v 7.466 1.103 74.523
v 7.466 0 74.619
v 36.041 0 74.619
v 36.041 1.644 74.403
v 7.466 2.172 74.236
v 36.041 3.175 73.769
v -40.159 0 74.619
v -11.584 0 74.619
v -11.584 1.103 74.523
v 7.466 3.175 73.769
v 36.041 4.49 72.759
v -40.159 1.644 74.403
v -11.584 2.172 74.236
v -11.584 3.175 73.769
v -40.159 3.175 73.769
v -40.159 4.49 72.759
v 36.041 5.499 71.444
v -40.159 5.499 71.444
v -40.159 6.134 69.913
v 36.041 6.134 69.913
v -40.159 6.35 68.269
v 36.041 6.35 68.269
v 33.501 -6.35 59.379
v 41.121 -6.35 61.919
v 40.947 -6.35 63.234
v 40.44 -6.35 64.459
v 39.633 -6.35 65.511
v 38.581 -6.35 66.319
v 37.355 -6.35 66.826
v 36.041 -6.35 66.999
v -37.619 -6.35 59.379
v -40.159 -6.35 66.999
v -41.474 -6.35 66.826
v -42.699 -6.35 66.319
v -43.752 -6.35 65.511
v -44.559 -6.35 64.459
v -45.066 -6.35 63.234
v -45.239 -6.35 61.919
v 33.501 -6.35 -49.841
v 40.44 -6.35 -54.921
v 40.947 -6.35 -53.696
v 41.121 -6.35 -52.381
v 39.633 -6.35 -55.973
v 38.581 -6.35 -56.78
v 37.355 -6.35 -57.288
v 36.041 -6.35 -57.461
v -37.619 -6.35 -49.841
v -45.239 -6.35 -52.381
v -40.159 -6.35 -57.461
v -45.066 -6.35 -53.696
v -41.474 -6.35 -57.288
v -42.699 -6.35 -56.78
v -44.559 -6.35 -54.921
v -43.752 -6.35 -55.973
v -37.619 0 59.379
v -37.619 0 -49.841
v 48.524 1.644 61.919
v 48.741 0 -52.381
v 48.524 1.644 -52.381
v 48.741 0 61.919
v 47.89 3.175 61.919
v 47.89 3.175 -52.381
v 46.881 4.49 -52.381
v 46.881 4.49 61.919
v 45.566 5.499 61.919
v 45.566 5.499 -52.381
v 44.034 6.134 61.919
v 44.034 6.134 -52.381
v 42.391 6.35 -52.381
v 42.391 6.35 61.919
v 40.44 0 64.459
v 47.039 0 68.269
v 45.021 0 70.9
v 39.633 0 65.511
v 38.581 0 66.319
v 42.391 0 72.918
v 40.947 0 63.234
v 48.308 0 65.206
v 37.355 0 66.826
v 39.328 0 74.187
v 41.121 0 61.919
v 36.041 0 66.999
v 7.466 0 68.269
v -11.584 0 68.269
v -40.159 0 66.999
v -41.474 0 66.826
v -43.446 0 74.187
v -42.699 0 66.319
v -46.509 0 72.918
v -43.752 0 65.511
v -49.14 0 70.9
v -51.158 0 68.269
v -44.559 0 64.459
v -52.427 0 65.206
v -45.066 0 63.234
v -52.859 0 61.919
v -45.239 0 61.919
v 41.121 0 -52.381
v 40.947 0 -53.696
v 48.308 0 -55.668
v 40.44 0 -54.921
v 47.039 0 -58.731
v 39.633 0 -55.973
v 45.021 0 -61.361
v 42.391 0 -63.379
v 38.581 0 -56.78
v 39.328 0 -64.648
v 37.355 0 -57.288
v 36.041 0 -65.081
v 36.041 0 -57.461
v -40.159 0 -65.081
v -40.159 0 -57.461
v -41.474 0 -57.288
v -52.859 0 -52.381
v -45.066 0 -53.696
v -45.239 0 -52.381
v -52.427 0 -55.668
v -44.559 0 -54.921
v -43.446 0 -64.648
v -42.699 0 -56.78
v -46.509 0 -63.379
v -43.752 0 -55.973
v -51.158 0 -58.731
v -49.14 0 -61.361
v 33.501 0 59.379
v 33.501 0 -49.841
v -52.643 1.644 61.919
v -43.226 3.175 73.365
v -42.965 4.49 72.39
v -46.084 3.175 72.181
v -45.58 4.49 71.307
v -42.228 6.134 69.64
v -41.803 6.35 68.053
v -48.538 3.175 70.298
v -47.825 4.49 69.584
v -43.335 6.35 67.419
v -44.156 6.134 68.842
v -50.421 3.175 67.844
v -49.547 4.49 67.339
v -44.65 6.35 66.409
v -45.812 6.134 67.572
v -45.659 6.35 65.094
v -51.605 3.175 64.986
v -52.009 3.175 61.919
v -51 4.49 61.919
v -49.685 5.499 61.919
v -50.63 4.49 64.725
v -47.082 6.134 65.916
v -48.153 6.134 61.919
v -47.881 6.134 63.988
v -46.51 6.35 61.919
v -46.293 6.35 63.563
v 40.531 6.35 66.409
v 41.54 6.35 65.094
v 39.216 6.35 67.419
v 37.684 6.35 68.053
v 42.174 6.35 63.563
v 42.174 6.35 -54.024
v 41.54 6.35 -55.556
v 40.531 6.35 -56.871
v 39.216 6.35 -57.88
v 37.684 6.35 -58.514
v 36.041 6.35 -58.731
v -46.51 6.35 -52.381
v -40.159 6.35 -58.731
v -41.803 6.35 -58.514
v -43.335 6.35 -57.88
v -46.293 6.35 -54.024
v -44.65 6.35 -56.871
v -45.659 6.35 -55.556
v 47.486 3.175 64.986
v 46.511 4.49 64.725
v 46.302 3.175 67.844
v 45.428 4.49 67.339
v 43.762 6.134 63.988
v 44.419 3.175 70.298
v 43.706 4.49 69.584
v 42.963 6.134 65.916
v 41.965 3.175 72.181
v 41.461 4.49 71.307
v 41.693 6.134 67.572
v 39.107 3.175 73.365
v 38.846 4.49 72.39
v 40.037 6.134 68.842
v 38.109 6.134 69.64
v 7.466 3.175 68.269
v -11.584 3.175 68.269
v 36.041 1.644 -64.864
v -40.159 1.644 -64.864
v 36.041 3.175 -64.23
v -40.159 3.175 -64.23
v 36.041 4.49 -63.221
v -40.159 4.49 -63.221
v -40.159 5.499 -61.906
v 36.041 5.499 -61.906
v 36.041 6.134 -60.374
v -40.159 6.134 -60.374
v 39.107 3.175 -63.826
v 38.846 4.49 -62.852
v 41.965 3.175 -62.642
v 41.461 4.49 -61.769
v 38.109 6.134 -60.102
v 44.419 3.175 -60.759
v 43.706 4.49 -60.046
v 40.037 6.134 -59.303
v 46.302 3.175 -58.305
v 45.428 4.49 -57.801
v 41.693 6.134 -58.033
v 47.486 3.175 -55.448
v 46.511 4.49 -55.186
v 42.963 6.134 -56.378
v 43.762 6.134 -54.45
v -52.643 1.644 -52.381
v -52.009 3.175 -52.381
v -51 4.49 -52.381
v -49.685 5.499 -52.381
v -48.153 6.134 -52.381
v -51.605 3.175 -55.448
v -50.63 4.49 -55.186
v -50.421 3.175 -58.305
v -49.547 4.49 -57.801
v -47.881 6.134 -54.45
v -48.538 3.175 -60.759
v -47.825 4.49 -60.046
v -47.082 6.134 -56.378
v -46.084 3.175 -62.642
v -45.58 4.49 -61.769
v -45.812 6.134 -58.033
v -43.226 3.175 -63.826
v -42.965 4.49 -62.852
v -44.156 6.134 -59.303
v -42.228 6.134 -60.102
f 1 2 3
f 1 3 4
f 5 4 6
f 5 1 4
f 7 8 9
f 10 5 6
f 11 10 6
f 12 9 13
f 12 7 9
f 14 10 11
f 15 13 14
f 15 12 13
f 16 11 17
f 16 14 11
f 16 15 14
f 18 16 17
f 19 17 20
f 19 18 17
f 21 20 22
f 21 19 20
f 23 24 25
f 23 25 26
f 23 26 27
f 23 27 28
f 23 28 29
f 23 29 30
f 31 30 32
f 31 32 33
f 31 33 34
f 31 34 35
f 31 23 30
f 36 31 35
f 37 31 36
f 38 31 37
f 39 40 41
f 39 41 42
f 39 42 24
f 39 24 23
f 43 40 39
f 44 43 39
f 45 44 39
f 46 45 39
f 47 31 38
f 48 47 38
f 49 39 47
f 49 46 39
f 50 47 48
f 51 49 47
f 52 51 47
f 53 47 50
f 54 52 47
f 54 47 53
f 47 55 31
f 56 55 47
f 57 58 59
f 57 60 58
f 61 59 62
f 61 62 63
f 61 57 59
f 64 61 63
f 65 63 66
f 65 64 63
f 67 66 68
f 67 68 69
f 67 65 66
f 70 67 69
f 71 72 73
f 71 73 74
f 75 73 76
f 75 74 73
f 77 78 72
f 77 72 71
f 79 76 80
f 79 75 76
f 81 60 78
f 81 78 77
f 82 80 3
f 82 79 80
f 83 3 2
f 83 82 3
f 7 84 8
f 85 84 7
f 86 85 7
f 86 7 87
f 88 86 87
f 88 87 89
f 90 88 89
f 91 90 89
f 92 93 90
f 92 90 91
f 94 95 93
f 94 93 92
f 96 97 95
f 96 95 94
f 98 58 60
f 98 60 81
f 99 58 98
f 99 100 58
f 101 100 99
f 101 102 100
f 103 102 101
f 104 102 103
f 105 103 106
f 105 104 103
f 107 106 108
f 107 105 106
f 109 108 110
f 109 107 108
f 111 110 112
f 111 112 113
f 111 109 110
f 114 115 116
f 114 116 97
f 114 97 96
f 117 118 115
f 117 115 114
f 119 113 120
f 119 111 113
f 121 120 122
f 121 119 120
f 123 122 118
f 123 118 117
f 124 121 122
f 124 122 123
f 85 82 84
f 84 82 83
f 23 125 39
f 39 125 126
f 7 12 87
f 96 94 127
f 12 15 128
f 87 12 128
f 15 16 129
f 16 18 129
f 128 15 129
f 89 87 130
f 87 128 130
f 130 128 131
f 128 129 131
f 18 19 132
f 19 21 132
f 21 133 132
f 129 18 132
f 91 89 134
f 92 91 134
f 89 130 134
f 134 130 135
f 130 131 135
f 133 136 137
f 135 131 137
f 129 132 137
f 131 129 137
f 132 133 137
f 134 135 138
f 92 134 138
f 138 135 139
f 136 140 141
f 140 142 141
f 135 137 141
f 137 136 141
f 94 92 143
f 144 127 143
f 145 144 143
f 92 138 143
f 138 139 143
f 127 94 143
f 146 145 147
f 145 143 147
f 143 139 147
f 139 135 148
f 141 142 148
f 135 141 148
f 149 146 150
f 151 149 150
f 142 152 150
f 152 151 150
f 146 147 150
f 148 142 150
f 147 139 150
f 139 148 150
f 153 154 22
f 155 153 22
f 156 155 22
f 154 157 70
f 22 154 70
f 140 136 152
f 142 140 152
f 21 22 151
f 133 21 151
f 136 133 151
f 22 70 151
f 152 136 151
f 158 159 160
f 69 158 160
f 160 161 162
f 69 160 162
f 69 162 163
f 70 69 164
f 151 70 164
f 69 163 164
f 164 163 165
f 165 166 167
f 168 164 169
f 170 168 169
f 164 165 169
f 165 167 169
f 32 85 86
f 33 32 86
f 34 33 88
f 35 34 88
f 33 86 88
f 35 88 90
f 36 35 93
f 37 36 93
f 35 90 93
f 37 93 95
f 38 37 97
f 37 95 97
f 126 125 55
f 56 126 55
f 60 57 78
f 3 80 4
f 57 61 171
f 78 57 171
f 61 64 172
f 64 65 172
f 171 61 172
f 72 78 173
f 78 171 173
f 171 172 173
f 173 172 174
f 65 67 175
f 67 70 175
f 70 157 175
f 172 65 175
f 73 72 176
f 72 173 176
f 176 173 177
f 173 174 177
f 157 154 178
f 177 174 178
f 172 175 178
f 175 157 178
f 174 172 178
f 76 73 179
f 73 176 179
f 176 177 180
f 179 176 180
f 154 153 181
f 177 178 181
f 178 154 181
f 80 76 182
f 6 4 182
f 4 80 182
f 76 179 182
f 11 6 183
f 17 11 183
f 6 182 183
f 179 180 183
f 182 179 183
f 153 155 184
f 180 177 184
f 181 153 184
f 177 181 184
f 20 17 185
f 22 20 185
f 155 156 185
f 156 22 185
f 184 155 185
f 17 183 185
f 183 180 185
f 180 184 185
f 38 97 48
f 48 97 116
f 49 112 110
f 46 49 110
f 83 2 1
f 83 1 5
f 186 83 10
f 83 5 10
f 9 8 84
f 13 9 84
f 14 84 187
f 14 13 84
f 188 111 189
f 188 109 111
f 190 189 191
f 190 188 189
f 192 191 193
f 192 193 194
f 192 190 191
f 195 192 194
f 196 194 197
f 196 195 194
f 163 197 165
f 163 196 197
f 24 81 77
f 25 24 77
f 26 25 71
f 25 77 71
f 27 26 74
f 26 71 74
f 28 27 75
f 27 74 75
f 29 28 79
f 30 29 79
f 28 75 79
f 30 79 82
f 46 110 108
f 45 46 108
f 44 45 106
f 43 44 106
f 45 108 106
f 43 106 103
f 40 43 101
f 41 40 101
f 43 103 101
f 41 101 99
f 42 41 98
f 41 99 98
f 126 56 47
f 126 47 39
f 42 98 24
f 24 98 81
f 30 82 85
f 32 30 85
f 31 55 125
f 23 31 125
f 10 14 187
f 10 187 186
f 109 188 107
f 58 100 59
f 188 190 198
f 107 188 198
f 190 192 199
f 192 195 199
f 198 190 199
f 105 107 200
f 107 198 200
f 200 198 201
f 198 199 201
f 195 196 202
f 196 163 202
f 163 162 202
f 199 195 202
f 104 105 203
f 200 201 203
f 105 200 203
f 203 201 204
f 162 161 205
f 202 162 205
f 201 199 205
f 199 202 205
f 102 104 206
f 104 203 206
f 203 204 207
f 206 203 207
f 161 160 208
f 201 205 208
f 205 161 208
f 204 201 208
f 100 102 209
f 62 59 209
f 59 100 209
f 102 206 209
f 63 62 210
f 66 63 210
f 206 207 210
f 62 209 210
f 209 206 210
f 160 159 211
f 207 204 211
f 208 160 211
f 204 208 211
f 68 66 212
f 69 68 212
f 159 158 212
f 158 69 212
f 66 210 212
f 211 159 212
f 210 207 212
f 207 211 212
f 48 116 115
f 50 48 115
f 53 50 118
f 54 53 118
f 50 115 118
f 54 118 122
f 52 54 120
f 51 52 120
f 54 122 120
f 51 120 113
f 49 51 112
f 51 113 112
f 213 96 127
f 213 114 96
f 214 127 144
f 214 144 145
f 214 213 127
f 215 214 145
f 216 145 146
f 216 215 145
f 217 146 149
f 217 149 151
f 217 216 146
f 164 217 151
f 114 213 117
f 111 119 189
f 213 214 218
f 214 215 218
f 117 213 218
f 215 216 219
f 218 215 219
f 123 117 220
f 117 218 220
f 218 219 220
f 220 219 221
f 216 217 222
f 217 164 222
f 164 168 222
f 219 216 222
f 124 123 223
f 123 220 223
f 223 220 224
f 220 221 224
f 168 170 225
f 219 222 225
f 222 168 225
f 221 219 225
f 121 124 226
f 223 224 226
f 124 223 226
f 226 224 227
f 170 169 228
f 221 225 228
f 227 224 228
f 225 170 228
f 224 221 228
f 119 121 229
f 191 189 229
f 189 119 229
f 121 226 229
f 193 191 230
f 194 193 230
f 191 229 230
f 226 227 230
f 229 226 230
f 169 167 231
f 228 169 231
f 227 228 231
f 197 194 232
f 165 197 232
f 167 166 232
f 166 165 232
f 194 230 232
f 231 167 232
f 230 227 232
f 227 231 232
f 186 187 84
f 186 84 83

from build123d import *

# Parameters (mm, degrees)
SKETCH1_W           = 71.12
SKETCH1_H           = 109.22
BOSS_EXTRUDE1_DEPTH = 6.35
BOSS_EXTRUDE3_DEPTH = 6.35
FILLET1_R           = 6.35
SKETCH3_W           = 19.05
SKETCH3_H           = 6.35
CUT_EXTRUDE1_DEPTH  = 6.35


with BuildPart() as part:
    # Sketch1 → Boss-Extrude1 (new body)
    with BuildSketch(Plane(origin=(0, 0, 0), x_dir=(1, 0, 0), z_dir=(0, 1, 0))):
        with BuildLine():
            Line((-40.159459459, 57.460725462), (36.040540541, 57.460725462))
            ThreePointArc((36.040540541, 57.460725462), (39.632642989, 55.972827911), (41.120540541, 52.380725462))
            Line((41.120540541, 52.380725462), (41.120540541, -61.919274538))
            ThreePointArc((41.120540541, -61.919274538), (39.632642989, -65.511376986), (36.040540541, -66.999274538))
            Line((36.040540541, -66.999274538), (-40.159459459, -66.999274538))
            ThreePointArc((-40.159459459, -66.999274538), (-43.751561908, -65.511376986), (-45.239459459, -61.919274538))
            Line((-45.239459459, -61.919274538), (-45.239459459, 52.380725462))
            ThreePointArc((-45.239459459, 52.380725462), (-43.751561908, 55.972827911), (-40.159459459, 57.460725462))
        make_face()
        with Locations((-2.059459459, -4.769274538)):
            Rectangle(SKETCH1_W, SKETCH1_H, mode=Mode.SUBTRACT)
    extrude(amount=-BOSS_EXTRUDE1_DEPTH)

    # Sketch1<4> → Boss-Extrude3 (add)
    with BuildSketch(Plane(origin=(0, 0, 0), x_dir=(1, 0, 0), z_dir=(0, 1, 0))):
        with BuildLine():
            Line((-40.159459459, 65.080725462), (36.040540541, 65.080725462))
            ThreePointArc((36.040540541, 65.080725462), (45.020796662, 61.360981583), (48.740540541, 52.380725462))
            Line((48.740540541, 52.380725462), (48.740540541, -61.919274538))
            ThreePointArc((48.740540541, -61.919274538), (45.020796662, -70.899530659), (36.040540541, -74.619274538))
            Line((36.040540541, -74.619274538), (-40.159459459, -74.619274538))
            ThreePointArc((-40.159459459, -74.619274538), (-49.139715581, -70.899530659), (-52.859459459, -61.919274538))
            Line((-52.859459459, -61.919274538), (-52.859459459, 52.380725462))
            ThreePointArc((-52.859459459, 52.380725462), (-49.139715581, 61.360981583), (-40.159459459, 65.080725462))
        make_face()
    extrude(amount=BOSS_EXTRUDE3_DEPTH)

    # Fillet1
    fillet1_edges = [part.edges().sort_by_distance(p)[0] for p in [
        (-49.139715581, 6.35, -61.360981583),
        (-2.059459459, 6.35, -65.080725462),
        (45.020796662, 6.35, -61.360981583),
        (48.740540541, 6.35, 4.769274538),
        (45.020796662, 6.35, 70.899530659),
        (-2.059459459, 6.35, 74.619274538),
        (-49.139715581, 6.35, 70.899530659),
        (-52.859459459, 6.35, 4.769274538),
    ]]
    fillet(fillet1_edges, radius=FILLET1_R - 0.0001)  # a hair under: the kernel refuses the full size

    # Sketch3 → Cut-Extrude1 (cut)
    with BuildSketch(Plane.XY.offset(74.619274538)):
        with Locations((-2.059459459, 0)):
            Rectangle(SKETCH3_W, SKETCH3_H)
    extrude(amount=-CUT_EXTRUDE1_DEPTH, mode=Mode.SUBTRACT)


solid = part.part
